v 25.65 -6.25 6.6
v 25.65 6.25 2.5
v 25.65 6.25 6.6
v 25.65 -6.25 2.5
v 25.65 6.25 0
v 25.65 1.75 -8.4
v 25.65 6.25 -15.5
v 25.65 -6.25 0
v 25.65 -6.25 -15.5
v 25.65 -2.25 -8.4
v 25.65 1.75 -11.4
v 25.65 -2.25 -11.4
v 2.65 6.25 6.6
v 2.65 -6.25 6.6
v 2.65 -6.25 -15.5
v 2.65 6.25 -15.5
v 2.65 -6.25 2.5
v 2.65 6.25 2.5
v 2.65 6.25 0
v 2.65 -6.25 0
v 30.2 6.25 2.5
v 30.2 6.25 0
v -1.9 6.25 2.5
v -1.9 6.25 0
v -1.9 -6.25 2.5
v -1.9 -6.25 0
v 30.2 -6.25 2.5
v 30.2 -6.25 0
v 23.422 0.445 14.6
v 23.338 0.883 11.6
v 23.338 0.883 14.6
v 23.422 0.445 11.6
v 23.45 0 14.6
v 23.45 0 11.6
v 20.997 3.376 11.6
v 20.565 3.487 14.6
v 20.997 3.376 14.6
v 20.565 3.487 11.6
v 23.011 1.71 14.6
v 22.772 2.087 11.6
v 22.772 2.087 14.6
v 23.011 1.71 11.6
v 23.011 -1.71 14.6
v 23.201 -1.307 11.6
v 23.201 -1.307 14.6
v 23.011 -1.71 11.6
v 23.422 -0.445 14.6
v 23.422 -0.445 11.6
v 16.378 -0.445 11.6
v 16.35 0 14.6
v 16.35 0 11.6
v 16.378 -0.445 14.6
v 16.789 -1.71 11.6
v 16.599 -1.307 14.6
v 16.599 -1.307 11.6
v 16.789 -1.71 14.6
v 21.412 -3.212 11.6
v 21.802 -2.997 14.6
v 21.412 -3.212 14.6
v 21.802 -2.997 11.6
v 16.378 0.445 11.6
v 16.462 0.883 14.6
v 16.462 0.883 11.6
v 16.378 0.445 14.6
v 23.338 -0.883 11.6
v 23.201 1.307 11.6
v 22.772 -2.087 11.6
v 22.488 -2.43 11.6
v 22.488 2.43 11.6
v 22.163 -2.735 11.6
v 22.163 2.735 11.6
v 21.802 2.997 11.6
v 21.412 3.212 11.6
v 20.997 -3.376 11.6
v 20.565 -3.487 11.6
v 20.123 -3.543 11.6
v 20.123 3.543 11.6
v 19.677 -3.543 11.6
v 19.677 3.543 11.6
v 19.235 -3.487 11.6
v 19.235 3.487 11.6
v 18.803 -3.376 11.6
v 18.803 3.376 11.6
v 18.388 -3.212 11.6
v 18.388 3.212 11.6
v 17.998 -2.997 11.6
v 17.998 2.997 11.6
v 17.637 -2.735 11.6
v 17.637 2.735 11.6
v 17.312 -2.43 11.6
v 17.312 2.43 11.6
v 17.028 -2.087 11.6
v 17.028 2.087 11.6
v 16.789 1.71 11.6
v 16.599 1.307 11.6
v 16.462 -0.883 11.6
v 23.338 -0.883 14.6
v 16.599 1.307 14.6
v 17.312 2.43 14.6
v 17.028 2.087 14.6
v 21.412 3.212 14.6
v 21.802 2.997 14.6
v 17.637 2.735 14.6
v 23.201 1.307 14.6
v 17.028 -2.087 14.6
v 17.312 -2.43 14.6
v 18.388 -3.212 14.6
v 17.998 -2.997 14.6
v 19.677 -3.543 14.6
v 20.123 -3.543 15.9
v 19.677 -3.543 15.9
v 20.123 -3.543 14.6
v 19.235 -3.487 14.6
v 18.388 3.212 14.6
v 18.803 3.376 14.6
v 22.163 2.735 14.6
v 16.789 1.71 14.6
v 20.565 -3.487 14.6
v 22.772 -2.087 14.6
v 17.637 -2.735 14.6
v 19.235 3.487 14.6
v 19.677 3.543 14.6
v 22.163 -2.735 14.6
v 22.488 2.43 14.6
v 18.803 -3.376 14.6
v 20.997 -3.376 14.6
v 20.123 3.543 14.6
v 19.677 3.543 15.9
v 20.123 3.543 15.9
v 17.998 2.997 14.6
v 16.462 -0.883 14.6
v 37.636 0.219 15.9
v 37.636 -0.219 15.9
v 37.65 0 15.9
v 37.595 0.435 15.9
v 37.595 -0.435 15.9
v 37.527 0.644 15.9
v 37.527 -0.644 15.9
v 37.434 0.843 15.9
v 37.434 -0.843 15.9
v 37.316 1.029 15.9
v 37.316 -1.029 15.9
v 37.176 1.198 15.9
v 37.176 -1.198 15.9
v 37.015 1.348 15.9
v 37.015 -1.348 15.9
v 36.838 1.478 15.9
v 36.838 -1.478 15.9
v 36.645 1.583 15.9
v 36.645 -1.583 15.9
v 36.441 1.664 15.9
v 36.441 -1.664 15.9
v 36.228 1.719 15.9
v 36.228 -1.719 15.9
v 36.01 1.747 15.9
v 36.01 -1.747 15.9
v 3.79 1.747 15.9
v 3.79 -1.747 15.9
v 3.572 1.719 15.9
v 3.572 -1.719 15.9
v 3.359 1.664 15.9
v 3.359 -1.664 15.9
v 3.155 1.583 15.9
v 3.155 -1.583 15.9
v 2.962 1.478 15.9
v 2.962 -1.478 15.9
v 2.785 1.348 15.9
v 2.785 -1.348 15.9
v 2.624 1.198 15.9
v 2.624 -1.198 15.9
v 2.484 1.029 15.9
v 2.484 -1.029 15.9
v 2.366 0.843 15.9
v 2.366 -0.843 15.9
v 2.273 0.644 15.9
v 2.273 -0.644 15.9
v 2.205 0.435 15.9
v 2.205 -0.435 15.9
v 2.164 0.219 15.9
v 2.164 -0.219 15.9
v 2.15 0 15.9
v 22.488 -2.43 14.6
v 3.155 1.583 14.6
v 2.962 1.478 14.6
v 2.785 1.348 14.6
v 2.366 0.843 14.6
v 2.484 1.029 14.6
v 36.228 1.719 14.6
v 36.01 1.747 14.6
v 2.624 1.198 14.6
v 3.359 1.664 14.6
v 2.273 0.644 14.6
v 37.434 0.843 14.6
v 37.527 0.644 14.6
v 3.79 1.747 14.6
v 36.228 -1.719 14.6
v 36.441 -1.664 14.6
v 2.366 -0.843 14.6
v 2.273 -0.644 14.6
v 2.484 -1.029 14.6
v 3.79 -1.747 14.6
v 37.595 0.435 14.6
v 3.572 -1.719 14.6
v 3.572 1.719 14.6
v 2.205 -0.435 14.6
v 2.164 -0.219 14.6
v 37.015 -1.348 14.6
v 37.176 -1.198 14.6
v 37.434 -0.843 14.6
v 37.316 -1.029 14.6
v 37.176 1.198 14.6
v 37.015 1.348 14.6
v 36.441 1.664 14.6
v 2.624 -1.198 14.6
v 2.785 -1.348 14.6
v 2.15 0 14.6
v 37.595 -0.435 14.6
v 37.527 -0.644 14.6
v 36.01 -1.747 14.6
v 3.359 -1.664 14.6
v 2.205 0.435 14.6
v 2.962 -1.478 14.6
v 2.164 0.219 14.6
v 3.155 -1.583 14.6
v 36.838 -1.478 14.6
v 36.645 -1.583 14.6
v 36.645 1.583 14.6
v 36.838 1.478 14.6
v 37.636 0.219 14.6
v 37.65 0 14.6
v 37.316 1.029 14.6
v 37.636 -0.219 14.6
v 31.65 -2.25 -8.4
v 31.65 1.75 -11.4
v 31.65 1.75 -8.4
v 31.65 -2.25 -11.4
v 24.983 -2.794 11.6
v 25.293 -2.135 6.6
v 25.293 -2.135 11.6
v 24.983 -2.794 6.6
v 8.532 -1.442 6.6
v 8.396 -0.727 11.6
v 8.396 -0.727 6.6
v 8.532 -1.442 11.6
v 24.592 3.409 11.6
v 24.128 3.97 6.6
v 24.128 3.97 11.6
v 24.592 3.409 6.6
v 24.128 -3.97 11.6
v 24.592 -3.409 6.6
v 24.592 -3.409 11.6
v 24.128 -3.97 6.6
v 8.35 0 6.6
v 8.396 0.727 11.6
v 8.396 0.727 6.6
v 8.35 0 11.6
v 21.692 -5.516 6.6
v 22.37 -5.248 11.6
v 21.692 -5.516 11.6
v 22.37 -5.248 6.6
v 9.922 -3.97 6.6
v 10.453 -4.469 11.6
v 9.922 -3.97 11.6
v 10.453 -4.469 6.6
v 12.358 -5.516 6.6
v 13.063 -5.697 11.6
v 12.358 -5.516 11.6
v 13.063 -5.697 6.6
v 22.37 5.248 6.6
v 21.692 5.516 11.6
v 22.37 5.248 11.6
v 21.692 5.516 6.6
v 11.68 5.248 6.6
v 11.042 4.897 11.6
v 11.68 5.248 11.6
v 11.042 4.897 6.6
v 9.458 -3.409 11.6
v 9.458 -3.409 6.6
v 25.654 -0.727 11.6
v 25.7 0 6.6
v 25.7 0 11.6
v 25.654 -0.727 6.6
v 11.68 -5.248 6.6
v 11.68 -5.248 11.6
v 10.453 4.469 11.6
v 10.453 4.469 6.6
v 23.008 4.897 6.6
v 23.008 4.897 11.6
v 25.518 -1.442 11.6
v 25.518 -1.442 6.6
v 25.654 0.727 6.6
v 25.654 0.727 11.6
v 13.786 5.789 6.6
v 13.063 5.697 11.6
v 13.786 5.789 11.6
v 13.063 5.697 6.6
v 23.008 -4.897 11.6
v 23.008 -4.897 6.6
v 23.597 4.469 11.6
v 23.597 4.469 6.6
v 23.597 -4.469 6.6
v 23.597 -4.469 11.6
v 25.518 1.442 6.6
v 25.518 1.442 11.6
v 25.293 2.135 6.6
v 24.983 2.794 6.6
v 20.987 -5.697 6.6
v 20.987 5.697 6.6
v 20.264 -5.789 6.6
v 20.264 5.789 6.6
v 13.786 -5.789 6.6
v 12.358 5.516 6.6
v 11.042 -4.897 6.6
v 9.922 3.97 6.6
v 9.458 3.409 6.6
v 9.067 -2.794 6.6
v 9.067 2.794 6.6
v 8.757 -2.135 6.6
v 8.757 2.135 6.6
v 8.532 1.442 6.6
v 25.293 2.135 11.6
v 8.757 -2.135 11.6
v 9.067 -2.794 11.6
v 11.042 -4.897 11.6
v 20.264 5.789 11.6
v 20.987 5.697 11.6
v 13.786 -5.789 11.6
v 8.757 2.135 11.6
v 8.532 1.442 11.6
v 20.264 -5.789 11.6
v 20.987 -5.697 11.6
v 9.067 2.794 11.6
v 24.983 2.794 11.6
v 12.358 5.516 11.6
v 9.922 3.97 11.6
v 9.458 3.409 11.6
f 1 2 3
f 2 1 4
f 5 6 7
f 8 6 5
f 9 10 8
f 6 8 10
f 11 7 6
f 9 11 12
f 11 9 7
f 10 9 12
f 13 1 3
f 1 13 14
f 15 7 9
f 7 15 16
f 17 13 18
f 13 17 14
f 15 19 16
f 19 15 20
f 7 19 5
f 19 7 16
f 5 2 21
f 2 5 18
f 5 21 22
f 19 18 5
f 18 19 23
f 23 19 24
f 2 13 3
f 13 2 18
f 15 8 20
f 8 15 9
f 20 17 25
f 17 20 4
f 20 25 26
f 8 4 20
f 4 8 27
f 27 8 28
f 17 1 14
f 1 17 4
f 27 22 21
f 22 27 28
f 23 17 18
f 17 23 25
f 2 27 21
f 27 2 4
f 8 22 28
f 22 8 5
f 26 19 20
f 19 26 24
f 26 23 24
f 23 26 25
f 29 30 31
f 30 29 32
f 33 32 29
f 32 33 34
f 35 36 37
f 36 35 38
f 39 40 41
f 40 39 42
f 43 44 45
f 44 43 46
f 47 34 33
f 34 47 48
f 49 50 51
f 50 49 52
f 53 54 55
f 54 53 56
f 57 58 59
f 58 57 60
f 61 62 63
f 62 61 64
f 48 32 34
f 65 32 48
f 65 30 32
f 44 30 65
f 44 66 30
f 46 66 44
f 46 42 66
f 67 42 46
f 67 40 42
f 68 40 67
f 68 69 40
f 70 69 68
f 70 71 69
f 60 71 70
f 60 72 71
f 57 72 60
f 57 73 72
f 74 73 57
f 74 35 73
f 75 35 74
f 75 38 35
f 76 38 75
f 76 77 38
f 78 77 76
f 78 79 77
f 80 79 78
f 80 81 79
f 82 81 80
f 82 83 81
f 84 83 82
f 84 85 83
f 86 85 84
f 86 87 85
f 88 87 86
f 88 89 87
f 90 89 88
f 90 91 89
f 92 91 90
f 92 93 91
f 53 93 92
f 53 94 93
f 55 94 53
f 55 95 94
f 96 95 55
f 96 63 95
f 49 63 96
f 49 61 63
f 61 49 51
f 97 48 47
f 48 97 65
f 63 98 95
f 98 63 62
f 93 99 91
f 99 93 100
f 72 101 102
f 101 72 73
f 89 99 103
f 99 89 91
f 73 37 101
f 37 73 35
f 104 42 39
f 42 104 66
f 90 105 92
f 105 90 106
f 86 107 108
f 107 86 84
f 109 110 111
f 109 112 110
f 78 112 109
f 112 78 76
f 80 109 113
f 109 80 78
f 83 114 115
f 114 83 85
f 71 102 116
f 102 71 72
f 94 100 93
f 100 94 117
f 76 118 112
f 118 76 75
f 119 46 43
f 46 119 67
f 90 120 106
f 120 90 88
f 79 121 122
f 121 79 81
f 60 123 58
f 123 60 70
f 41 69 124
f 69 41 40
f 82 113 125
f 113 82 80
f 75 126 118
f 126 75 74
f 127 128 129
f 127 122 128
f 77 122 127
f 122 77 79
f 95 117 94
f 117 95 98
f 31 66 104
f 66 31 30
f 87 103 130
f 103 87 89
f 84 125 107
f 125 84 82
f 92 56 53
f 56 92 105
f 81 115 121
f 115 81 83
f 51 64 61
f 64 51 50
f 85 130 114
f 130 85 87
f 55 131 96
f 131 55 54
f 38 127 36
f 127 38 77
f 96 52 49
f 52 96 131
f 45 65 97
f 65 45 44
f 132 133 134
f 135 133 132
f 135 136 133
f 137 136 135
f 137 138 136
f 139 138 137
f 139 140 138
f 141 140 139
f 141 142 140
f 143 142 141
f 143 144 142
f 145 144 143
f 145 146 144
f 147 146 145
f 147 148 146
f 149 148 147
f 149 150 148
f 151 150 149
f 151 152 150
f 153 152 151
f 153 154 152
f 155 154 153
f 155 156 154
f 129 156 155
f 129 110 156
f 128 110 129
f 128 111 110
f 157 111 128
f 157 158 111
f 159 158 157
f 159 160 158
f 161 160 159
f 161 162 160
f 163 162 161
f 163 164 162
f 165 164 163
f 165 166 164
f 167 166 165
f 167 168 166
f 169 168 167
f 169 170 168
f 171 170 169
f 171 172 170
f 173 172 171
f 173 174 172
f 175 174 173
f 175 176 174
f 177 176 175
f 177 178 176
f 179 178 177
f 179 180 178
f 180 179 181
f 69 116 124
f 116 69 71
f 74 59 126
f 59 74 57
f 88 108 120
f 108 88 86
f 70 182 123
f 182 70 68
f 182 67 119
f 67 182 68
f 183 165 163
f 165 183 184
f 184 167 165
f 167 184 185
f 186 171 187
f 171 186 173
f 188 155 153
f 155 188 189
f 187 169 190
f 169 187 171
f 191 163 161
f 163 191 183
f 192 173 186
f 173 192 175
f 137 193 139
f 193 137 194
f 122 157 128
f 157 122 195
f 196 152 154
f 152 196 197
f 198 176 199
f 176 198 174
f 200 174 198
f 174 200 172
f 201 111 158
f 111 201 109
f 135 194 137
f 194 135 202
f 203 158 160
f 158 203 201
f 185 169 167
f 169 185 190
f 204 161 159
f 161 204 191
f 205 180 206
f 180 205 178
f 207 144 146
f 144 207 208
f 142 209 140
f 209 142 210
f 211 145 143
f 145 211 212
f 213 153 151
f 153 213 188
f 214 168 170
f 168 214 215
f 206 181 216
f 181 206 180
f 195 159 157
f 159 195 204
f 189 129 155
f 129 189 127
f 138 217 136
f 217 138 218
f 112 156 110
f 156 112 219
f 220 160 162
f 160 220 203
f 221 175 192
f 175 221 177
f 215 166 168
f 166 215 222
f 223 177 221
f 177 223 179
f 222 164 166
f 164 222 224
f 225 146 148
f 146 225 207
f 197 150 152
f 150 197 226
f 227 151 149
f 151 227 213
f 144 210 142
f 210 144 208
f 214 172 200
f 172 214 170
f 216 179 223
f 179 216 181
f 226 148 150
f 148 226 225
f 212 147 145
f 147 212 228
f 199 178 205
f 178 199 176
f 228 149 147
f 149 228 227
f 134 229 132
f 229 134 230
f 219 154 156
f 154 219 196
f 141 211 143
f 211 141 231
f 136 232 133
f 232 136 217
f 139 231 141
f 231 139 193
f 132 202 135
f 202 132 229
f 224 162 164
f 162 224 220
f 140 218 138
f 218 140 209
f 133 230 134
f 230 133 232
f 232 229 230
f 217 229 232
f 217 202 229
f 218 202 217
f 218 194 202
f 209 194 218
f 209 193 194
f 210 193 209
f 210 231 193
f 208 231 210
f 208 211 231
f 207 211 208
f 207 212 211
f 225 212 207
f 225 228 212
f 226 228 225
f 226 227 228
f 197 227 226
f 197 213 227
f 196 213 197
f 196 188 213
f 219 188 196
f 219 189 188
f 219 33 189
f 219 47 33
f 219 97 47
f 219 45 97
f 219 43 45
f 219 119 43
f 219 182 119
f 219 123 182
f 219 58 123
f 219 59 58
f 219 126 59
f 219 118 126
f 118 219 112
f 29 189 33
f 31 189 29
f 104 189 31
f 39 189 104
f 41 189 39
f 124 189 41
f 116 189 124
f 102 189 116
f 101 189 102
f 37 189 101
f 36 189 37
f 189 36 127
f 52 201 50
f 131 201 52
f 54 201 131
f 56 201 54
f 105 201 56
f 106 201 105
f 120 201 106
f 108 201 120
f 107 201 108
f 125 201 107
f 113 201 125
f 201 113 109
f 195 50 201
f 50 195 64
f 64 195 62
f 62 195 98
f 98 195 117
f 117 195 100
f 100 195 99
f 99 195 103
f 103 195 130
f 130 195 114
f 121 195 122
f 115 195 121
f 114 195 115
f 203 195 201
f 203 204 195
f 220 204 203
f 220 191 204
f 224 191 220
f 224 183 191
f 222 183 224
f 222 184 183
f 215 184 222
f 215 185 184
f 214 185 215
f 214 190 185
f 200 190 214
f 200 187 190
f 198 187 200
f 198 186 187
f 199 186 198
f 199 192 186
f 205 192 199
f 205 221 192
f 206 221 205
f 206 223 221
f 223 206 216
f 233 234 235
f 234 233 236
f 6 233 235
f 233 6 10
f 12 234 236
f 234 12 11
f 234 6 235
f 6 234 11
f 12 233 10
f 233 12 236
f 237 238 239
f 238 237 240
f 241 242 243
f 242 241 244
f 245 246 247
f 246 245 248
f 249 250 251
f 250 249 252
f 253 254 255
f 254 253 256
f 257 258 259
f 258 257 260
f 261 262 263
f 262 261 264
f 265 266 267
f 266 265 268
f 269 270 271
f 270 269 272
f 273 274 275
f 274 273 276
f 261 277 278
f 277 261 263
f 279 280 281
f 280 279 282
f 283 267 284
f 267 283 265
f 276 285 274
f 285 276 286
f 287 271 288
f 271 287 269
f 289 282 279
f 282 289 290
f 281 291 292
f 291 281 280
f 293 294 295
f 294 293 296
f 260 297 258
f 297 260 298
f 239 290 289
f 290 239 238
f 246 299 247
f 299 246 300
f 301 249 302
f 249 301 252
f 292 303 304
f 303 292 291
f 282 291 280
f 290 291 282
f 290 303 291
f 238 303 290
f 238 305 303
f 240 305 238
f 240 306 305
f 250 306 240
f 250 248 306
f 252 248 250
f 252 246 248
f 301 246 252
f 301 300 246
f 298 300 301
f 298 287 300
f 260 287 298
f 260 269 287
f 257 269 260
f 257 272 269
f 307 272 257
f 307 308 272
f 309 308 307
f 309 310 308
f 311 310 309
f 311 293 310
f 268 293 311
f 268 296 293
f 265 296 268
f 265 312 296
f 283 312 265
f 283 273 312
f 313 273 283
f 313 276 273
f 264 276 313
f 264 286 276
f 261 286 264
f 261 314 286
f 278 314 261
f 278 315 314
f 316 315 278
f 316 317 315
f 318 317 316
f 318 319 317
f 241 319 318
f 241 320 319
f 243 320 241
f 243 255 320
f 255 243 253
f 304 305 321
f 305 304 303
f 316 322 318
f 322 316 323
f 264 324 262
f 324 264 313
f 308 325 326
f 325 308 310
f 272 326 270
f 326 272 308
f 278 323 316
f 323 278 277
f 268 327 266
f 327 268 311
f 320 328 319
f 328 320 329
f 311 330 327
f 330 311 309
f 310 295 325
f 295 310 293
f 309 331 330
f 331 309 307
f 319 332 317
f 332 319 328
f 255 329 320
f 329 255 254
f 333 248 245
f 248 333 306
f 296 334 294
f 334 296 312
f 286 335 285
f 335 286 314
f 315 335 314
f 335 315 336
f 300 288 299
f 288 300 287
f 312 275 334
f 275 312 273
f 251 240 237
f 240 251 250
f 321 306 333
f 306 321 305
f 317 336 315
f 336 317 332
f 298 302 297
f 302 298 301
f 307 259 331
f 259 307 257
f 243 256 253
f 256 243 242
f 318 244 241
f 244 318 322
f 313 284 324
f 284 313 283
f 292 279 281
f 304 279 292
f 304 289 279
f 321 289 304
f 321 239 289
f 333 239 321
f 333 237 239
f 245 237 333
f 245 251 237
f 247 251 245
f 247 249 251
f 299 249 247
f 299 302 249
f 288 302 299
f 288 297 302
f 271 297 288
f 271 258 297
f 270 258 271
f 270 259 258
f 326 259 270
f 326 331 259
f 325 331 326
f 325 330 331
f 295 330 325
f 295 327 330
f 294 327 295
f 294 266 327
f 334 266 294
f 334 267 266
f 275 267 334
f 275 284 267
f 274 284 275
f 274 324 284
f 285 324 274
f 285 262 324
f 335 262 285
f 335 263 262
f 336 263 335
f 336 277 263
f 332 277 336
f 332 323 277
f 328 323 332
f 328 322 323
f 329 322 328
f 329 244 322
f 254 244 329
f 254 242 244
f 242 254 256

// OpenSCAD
$fn=50;

// oriented facing up, with the center of the bottom
// on the XY plane

// error term for making sure tangent objects are fused
fuse = 0.0001;

// measurements
m_body_width = 23;
m_body_height = 22.1;
m_body_base_to_wingtop = 18.0;
m_body_wing_height = 2.5;
m_body_wingtip_to_wingtip = 32.1;
m_body_depth = 12.5;
m_cord_depth = 4;
m_cord_height = 3;
m_cord_zloc = 5.6;

m_boss_height = 5;
m_boss_diameter = 11.6;

m_horn_top = 31.4;
m_horn_base_diameter = 7.1;
m_horn_end_diameter = 3.5;
m_horn_length = 32;
m_horn_th = 1.3;

// ----- mounting holes ----
sg90_mounting_hole_dia = 2.5; // mm
sg90_mounting_hole_d_from_body = 2.65; // mm
sg90_mounting_hole_separation = m_body_width + sg90_mounting_hole_d_from_body * 2;

// The following are approximate, at best!

module sg90(horn_angle=0, cord_length=6) {
    body();
    cord(length = cord_length);
    boss();
    horn(angle=horn_angle);
}

// sg90 with the underside of the mounting hole farthest from the servo horn
// at the origin
module sg90_mount_origin() {
    translate([m_body_width/2 + sg90_mounting_hole_d_from_body,
	       0,
	       -m_body_base_to_wingtop + m_body_wing_height])
    sg90();
}

module horn(angle = 0) {
    horn_height = m_horn_top - (m_body_height + m_boss_height);
    translate([m_body_width/4,0,m_body_height+m_boss_height])
    rotate([0,0,angle])
    union() {
        cylinder(h=horn_height,
            d = m_horn_base_diameter);
        translate([0,0,horn_height - m_horn_th])        
        hull() {
            translate([m_horn_length/2,0,0])
            cylinder(h=m_horn_th, d = m_horn_end_diameter);
            translate([-m_horn_length/2,0,0])
            cylinder(h=m_horn_th, d = m_horn_end_diameter);
            cylinder(h=m_horn_th, d = m_horn_base_diameter);
        }
    }
}

module cord(length = 6) {
    // cord clearance
    translate([-fuse, 0, 0])
    translate([m_body_width/2,m_cord_depth-m_body_depth/2,
        m_cord_zloc-m_cord_height/2])
    cube([length, m_cord_depth, m_cord_height]);
}

module body() {
    translate([0,0,-fuse])
    translate([-m_body_width/2, -m_body_depth/2, 0])
    union() {
        cube([m_body_width, m_body_depth, m_body_height]);
        translate([-(m_body_wingtip_to_wingtip - m_body_width)/2,
            0, m_body_base_to_wingtop - m_body_wing_height])
        cube([m_body_wingtip_to_wingtip, 
            m_body_depth, m_body_wing_height]);
    }
}

module boss() {
    translate([0,0,m_body_height])
    hull() {
        cylinder(h=m_boss_height, d = m_boss_diameter);
        translate([m_body_width/4,0,0])
        cylinder(h=m_boss_height, d = m_boss_diameter);
    }        
}   

sg90_mount_origin();
